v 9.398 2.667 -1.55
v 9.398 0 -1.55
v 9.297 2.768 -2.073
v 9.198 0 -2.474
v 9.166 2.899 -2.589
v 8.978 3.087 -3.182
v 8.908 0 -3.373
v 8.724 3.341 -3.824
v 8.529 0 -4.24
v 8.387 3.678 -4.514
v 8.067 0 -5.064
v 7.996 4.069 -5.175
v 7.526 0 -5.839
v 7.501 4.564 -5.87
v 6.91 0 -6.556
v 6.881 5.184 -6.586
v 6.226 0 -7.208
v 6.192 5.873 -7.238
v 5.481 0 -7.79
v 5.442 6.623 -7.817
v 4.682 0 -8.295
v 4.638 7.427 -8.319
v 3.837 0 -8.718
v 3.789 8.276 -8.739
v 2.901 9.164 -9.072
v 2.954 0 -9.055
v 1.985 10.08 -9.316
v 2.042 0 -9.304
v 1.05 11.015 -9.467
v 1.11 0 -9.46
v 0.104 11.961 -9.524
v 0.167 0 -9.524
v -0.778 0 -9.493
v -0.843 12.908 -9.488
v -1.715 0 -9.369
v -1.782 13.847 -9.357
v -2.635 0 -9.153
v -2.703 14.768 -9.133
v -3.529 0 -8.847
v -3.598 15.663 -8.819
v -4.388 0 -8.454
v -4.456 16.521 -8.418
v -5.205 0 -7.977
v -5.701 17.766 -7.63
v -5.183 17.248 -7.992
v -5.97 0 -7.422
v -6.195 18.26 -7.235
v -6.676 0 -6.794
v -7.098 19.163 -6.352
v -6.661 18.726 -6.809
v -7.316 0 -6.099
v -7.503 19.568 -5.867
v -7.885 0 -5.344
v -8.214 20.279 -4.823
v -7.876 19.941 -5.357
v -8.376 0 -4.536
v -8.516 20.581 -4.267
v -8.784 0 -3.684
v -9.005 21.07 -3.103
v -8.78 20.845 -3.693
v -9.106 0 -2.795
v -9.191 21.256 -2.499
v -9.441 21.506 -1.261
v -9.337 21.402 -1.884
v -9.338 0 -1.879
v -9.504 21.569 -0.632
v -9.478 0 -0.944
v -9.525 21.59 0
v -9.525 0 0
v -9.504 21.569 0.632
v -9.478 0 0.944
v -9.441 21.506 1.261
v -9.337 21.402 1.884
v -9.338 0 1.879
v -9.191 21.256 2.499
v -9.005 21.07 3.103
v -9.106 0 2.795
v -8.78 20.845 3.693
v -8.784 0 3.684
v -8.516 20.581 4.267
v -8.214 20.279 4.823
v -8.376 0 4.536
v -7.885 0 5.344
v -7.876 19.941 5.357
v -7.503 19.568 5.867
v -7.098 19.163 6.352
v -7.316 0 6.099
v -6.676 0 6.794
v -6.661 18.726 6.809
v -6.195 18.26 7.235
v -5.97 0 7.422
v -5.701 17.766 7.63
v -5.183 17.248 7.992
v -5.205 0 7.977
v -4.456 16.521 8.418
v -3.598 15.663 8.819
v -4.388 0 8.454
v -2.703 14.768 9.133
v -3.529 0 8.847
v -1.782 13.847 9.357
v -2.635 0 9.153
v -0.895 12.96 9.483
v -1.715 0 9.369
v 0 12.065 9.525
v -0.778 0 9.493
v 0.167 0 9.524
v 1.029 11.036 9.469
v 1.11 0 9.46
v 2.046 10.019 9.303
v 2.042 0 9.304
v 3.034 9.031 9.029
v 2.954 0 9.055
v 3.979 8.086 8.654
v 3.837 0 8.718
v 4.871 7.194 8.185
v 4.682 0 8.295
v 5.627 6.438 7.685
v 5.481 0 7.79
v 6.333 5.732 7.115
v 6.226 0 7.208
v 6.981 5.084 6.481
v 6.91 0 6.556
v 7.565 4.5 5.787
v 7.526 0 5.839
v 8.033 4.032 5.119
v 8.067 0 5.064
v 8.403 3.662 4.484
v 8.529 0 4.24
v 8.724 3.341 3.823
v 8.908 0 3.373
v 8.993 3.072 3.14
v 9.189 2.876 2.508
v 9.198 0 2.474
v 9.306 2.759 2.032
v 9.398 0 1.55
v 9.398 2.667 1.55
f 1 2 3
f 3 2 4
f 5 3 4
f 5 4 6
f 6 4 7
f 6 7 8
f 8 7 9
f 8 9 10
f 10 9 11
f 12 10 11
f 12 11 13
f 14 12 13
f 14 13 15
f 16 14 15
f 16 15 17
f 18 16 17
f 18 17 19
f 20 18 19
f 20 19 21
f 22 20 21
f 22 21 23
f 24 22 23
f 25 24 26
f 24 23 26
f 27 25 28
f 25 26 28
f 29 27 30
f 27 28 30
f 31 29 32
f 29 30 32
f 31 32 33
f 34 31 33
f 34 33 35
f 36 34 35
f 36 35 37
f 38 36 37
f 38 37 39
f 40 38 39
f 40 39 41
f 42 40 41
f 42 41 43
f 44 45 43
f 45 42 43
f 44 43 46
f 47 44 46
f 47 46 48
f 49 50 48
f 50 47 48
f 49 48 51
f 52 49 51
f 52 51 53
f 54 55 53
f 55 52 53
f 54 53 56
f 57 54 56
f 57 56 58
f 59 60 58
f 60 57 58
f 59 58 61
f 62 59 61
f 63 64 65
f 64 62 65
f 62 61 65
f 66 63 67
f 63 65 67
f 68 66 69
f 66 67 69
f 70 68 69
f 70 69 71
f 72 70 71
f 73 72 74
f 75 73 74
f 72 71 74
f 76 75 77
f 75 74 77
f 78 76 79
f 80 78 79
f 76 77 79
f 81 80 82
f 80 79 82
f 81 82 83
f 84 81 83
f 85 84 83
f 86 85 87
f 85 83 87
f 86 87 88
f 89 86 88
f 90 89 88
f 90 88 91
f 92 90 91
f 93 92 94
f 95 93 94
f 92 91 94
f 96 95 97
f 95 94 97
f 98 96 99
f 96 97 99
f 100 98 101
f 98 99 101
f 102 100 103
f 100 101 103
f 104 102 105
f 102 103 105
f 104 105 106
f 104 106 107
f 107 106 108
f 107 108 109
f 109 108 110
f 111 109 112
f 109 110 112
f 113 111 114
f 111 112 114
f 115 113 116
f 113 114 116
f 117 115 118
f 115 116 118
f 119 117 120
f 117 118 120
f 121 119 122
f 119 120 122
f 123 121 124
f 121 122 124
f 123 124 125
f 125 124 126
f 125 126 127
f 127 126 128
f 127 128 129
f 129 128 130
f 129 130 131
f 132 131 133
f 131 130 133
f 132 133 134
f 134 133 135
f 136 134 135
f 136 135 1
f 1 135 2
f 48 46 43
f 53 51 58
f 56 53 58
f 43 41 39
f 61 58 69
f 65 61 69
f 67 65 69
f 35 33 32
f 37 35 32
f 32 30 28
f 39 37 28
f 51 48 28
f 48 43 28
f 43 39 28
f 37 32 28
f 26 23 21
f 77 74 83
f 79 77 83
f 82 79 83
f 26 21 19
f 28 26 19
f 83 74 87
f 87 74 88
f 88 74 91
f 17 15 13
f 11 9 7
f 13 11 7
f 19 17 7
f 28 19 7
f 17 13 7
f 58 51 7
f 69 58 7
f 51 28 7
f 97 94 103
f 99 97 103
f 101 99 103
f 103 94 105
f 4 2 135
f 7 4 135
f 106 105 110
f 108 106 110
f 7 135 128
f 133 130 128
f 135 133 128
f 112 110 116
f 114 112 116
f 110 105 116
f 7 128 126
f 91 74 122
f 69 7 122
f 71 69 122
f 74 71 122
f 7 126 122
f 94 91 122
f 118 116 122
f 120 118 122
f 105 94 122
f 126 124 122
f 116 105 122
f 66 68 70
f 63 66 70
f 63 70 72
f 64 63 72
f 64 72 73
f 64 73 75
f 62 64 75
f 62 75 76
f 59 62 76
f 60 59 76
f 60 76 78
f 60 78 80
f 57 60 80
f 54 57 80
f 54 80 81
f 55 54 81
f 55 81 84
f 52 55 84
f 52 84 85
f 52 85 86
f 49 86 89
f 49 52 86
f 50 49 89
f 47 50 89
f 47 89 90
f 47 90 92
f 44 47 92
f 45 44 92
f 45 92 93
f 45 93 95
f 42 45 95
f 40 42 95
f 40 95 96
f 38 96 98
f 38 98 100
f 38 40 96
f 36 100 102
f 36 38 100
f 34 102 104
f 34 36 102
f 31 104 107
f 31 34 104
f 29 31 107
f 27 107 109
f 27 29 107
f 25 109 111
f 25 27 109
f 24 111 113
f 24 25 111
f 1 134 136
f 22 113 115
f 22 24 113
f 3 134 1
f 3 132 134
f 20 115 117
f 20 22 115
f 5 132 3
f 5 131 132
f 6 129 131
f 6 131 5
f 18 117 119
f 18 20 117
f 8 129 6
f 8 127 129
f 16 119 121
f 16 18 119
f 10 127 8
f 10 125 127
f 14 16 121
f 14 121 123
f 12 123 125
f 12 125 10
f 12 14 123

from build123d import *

# Parameters (mm, degrees)
SKETCH1_R               = 9.525
EXTRUDE1_DEPTH          = 21.59
CUT_EXTRUDE1_DEPTH      = 10.525
CUT_EXTRUDE1_DEPTH_BACK = 10.525
CUT_EXTRUDE2_DEPTH      = 22.59


with BuildPart() as part:
    # Sketch1 → Extrude1 (new body)
    with BuildSketch(Plane(origin=(0, 0, 0), x_dir=(1, 0, 0), z_dir=(0, 1, 0))):
        with Locations(Location((0, 0, 0), (0, 0, 270))):  # turned: the seam where the file's is
            Circle(SKETCH1_R)
    extrude(amount=EXTRUDE1_DEPTH)

    # Sketch2 → Cut-Extrude1 (cut, two sides)
    with BuildSketch(Plane.XY) as cut_extrude1_sk:
        Polygon((-9.525, 21.59), (9.525, 2.54), (9.525, 21.59), align=None)
    extrude(amount=CUT_EXTRUDE1_DEPTH, mode=Mode.SUBTRACT)
    extrude(cut_extrude1_sk.sketch, amount=-CUT_EXTRUDE1_DEPTH_BACK, mode=Mode.SUBTRACT)

    # Sketch3 → Cut-Extrude2 (cut, through all)
    with BuildSketch(Plane.XZ):
        with BuildLine():
            Line((9.398, 1.550232563), (9.398, -1.550232563))
            ThreePointArc((9.398, -1.550232563), (9.525, 0), (9.398, 1.550232563))
        make_face()
    extrude(amount=-CUT_EXTRUDE2_DEPTH, mode=Mode.SUBTRACT)


solid = part.part
